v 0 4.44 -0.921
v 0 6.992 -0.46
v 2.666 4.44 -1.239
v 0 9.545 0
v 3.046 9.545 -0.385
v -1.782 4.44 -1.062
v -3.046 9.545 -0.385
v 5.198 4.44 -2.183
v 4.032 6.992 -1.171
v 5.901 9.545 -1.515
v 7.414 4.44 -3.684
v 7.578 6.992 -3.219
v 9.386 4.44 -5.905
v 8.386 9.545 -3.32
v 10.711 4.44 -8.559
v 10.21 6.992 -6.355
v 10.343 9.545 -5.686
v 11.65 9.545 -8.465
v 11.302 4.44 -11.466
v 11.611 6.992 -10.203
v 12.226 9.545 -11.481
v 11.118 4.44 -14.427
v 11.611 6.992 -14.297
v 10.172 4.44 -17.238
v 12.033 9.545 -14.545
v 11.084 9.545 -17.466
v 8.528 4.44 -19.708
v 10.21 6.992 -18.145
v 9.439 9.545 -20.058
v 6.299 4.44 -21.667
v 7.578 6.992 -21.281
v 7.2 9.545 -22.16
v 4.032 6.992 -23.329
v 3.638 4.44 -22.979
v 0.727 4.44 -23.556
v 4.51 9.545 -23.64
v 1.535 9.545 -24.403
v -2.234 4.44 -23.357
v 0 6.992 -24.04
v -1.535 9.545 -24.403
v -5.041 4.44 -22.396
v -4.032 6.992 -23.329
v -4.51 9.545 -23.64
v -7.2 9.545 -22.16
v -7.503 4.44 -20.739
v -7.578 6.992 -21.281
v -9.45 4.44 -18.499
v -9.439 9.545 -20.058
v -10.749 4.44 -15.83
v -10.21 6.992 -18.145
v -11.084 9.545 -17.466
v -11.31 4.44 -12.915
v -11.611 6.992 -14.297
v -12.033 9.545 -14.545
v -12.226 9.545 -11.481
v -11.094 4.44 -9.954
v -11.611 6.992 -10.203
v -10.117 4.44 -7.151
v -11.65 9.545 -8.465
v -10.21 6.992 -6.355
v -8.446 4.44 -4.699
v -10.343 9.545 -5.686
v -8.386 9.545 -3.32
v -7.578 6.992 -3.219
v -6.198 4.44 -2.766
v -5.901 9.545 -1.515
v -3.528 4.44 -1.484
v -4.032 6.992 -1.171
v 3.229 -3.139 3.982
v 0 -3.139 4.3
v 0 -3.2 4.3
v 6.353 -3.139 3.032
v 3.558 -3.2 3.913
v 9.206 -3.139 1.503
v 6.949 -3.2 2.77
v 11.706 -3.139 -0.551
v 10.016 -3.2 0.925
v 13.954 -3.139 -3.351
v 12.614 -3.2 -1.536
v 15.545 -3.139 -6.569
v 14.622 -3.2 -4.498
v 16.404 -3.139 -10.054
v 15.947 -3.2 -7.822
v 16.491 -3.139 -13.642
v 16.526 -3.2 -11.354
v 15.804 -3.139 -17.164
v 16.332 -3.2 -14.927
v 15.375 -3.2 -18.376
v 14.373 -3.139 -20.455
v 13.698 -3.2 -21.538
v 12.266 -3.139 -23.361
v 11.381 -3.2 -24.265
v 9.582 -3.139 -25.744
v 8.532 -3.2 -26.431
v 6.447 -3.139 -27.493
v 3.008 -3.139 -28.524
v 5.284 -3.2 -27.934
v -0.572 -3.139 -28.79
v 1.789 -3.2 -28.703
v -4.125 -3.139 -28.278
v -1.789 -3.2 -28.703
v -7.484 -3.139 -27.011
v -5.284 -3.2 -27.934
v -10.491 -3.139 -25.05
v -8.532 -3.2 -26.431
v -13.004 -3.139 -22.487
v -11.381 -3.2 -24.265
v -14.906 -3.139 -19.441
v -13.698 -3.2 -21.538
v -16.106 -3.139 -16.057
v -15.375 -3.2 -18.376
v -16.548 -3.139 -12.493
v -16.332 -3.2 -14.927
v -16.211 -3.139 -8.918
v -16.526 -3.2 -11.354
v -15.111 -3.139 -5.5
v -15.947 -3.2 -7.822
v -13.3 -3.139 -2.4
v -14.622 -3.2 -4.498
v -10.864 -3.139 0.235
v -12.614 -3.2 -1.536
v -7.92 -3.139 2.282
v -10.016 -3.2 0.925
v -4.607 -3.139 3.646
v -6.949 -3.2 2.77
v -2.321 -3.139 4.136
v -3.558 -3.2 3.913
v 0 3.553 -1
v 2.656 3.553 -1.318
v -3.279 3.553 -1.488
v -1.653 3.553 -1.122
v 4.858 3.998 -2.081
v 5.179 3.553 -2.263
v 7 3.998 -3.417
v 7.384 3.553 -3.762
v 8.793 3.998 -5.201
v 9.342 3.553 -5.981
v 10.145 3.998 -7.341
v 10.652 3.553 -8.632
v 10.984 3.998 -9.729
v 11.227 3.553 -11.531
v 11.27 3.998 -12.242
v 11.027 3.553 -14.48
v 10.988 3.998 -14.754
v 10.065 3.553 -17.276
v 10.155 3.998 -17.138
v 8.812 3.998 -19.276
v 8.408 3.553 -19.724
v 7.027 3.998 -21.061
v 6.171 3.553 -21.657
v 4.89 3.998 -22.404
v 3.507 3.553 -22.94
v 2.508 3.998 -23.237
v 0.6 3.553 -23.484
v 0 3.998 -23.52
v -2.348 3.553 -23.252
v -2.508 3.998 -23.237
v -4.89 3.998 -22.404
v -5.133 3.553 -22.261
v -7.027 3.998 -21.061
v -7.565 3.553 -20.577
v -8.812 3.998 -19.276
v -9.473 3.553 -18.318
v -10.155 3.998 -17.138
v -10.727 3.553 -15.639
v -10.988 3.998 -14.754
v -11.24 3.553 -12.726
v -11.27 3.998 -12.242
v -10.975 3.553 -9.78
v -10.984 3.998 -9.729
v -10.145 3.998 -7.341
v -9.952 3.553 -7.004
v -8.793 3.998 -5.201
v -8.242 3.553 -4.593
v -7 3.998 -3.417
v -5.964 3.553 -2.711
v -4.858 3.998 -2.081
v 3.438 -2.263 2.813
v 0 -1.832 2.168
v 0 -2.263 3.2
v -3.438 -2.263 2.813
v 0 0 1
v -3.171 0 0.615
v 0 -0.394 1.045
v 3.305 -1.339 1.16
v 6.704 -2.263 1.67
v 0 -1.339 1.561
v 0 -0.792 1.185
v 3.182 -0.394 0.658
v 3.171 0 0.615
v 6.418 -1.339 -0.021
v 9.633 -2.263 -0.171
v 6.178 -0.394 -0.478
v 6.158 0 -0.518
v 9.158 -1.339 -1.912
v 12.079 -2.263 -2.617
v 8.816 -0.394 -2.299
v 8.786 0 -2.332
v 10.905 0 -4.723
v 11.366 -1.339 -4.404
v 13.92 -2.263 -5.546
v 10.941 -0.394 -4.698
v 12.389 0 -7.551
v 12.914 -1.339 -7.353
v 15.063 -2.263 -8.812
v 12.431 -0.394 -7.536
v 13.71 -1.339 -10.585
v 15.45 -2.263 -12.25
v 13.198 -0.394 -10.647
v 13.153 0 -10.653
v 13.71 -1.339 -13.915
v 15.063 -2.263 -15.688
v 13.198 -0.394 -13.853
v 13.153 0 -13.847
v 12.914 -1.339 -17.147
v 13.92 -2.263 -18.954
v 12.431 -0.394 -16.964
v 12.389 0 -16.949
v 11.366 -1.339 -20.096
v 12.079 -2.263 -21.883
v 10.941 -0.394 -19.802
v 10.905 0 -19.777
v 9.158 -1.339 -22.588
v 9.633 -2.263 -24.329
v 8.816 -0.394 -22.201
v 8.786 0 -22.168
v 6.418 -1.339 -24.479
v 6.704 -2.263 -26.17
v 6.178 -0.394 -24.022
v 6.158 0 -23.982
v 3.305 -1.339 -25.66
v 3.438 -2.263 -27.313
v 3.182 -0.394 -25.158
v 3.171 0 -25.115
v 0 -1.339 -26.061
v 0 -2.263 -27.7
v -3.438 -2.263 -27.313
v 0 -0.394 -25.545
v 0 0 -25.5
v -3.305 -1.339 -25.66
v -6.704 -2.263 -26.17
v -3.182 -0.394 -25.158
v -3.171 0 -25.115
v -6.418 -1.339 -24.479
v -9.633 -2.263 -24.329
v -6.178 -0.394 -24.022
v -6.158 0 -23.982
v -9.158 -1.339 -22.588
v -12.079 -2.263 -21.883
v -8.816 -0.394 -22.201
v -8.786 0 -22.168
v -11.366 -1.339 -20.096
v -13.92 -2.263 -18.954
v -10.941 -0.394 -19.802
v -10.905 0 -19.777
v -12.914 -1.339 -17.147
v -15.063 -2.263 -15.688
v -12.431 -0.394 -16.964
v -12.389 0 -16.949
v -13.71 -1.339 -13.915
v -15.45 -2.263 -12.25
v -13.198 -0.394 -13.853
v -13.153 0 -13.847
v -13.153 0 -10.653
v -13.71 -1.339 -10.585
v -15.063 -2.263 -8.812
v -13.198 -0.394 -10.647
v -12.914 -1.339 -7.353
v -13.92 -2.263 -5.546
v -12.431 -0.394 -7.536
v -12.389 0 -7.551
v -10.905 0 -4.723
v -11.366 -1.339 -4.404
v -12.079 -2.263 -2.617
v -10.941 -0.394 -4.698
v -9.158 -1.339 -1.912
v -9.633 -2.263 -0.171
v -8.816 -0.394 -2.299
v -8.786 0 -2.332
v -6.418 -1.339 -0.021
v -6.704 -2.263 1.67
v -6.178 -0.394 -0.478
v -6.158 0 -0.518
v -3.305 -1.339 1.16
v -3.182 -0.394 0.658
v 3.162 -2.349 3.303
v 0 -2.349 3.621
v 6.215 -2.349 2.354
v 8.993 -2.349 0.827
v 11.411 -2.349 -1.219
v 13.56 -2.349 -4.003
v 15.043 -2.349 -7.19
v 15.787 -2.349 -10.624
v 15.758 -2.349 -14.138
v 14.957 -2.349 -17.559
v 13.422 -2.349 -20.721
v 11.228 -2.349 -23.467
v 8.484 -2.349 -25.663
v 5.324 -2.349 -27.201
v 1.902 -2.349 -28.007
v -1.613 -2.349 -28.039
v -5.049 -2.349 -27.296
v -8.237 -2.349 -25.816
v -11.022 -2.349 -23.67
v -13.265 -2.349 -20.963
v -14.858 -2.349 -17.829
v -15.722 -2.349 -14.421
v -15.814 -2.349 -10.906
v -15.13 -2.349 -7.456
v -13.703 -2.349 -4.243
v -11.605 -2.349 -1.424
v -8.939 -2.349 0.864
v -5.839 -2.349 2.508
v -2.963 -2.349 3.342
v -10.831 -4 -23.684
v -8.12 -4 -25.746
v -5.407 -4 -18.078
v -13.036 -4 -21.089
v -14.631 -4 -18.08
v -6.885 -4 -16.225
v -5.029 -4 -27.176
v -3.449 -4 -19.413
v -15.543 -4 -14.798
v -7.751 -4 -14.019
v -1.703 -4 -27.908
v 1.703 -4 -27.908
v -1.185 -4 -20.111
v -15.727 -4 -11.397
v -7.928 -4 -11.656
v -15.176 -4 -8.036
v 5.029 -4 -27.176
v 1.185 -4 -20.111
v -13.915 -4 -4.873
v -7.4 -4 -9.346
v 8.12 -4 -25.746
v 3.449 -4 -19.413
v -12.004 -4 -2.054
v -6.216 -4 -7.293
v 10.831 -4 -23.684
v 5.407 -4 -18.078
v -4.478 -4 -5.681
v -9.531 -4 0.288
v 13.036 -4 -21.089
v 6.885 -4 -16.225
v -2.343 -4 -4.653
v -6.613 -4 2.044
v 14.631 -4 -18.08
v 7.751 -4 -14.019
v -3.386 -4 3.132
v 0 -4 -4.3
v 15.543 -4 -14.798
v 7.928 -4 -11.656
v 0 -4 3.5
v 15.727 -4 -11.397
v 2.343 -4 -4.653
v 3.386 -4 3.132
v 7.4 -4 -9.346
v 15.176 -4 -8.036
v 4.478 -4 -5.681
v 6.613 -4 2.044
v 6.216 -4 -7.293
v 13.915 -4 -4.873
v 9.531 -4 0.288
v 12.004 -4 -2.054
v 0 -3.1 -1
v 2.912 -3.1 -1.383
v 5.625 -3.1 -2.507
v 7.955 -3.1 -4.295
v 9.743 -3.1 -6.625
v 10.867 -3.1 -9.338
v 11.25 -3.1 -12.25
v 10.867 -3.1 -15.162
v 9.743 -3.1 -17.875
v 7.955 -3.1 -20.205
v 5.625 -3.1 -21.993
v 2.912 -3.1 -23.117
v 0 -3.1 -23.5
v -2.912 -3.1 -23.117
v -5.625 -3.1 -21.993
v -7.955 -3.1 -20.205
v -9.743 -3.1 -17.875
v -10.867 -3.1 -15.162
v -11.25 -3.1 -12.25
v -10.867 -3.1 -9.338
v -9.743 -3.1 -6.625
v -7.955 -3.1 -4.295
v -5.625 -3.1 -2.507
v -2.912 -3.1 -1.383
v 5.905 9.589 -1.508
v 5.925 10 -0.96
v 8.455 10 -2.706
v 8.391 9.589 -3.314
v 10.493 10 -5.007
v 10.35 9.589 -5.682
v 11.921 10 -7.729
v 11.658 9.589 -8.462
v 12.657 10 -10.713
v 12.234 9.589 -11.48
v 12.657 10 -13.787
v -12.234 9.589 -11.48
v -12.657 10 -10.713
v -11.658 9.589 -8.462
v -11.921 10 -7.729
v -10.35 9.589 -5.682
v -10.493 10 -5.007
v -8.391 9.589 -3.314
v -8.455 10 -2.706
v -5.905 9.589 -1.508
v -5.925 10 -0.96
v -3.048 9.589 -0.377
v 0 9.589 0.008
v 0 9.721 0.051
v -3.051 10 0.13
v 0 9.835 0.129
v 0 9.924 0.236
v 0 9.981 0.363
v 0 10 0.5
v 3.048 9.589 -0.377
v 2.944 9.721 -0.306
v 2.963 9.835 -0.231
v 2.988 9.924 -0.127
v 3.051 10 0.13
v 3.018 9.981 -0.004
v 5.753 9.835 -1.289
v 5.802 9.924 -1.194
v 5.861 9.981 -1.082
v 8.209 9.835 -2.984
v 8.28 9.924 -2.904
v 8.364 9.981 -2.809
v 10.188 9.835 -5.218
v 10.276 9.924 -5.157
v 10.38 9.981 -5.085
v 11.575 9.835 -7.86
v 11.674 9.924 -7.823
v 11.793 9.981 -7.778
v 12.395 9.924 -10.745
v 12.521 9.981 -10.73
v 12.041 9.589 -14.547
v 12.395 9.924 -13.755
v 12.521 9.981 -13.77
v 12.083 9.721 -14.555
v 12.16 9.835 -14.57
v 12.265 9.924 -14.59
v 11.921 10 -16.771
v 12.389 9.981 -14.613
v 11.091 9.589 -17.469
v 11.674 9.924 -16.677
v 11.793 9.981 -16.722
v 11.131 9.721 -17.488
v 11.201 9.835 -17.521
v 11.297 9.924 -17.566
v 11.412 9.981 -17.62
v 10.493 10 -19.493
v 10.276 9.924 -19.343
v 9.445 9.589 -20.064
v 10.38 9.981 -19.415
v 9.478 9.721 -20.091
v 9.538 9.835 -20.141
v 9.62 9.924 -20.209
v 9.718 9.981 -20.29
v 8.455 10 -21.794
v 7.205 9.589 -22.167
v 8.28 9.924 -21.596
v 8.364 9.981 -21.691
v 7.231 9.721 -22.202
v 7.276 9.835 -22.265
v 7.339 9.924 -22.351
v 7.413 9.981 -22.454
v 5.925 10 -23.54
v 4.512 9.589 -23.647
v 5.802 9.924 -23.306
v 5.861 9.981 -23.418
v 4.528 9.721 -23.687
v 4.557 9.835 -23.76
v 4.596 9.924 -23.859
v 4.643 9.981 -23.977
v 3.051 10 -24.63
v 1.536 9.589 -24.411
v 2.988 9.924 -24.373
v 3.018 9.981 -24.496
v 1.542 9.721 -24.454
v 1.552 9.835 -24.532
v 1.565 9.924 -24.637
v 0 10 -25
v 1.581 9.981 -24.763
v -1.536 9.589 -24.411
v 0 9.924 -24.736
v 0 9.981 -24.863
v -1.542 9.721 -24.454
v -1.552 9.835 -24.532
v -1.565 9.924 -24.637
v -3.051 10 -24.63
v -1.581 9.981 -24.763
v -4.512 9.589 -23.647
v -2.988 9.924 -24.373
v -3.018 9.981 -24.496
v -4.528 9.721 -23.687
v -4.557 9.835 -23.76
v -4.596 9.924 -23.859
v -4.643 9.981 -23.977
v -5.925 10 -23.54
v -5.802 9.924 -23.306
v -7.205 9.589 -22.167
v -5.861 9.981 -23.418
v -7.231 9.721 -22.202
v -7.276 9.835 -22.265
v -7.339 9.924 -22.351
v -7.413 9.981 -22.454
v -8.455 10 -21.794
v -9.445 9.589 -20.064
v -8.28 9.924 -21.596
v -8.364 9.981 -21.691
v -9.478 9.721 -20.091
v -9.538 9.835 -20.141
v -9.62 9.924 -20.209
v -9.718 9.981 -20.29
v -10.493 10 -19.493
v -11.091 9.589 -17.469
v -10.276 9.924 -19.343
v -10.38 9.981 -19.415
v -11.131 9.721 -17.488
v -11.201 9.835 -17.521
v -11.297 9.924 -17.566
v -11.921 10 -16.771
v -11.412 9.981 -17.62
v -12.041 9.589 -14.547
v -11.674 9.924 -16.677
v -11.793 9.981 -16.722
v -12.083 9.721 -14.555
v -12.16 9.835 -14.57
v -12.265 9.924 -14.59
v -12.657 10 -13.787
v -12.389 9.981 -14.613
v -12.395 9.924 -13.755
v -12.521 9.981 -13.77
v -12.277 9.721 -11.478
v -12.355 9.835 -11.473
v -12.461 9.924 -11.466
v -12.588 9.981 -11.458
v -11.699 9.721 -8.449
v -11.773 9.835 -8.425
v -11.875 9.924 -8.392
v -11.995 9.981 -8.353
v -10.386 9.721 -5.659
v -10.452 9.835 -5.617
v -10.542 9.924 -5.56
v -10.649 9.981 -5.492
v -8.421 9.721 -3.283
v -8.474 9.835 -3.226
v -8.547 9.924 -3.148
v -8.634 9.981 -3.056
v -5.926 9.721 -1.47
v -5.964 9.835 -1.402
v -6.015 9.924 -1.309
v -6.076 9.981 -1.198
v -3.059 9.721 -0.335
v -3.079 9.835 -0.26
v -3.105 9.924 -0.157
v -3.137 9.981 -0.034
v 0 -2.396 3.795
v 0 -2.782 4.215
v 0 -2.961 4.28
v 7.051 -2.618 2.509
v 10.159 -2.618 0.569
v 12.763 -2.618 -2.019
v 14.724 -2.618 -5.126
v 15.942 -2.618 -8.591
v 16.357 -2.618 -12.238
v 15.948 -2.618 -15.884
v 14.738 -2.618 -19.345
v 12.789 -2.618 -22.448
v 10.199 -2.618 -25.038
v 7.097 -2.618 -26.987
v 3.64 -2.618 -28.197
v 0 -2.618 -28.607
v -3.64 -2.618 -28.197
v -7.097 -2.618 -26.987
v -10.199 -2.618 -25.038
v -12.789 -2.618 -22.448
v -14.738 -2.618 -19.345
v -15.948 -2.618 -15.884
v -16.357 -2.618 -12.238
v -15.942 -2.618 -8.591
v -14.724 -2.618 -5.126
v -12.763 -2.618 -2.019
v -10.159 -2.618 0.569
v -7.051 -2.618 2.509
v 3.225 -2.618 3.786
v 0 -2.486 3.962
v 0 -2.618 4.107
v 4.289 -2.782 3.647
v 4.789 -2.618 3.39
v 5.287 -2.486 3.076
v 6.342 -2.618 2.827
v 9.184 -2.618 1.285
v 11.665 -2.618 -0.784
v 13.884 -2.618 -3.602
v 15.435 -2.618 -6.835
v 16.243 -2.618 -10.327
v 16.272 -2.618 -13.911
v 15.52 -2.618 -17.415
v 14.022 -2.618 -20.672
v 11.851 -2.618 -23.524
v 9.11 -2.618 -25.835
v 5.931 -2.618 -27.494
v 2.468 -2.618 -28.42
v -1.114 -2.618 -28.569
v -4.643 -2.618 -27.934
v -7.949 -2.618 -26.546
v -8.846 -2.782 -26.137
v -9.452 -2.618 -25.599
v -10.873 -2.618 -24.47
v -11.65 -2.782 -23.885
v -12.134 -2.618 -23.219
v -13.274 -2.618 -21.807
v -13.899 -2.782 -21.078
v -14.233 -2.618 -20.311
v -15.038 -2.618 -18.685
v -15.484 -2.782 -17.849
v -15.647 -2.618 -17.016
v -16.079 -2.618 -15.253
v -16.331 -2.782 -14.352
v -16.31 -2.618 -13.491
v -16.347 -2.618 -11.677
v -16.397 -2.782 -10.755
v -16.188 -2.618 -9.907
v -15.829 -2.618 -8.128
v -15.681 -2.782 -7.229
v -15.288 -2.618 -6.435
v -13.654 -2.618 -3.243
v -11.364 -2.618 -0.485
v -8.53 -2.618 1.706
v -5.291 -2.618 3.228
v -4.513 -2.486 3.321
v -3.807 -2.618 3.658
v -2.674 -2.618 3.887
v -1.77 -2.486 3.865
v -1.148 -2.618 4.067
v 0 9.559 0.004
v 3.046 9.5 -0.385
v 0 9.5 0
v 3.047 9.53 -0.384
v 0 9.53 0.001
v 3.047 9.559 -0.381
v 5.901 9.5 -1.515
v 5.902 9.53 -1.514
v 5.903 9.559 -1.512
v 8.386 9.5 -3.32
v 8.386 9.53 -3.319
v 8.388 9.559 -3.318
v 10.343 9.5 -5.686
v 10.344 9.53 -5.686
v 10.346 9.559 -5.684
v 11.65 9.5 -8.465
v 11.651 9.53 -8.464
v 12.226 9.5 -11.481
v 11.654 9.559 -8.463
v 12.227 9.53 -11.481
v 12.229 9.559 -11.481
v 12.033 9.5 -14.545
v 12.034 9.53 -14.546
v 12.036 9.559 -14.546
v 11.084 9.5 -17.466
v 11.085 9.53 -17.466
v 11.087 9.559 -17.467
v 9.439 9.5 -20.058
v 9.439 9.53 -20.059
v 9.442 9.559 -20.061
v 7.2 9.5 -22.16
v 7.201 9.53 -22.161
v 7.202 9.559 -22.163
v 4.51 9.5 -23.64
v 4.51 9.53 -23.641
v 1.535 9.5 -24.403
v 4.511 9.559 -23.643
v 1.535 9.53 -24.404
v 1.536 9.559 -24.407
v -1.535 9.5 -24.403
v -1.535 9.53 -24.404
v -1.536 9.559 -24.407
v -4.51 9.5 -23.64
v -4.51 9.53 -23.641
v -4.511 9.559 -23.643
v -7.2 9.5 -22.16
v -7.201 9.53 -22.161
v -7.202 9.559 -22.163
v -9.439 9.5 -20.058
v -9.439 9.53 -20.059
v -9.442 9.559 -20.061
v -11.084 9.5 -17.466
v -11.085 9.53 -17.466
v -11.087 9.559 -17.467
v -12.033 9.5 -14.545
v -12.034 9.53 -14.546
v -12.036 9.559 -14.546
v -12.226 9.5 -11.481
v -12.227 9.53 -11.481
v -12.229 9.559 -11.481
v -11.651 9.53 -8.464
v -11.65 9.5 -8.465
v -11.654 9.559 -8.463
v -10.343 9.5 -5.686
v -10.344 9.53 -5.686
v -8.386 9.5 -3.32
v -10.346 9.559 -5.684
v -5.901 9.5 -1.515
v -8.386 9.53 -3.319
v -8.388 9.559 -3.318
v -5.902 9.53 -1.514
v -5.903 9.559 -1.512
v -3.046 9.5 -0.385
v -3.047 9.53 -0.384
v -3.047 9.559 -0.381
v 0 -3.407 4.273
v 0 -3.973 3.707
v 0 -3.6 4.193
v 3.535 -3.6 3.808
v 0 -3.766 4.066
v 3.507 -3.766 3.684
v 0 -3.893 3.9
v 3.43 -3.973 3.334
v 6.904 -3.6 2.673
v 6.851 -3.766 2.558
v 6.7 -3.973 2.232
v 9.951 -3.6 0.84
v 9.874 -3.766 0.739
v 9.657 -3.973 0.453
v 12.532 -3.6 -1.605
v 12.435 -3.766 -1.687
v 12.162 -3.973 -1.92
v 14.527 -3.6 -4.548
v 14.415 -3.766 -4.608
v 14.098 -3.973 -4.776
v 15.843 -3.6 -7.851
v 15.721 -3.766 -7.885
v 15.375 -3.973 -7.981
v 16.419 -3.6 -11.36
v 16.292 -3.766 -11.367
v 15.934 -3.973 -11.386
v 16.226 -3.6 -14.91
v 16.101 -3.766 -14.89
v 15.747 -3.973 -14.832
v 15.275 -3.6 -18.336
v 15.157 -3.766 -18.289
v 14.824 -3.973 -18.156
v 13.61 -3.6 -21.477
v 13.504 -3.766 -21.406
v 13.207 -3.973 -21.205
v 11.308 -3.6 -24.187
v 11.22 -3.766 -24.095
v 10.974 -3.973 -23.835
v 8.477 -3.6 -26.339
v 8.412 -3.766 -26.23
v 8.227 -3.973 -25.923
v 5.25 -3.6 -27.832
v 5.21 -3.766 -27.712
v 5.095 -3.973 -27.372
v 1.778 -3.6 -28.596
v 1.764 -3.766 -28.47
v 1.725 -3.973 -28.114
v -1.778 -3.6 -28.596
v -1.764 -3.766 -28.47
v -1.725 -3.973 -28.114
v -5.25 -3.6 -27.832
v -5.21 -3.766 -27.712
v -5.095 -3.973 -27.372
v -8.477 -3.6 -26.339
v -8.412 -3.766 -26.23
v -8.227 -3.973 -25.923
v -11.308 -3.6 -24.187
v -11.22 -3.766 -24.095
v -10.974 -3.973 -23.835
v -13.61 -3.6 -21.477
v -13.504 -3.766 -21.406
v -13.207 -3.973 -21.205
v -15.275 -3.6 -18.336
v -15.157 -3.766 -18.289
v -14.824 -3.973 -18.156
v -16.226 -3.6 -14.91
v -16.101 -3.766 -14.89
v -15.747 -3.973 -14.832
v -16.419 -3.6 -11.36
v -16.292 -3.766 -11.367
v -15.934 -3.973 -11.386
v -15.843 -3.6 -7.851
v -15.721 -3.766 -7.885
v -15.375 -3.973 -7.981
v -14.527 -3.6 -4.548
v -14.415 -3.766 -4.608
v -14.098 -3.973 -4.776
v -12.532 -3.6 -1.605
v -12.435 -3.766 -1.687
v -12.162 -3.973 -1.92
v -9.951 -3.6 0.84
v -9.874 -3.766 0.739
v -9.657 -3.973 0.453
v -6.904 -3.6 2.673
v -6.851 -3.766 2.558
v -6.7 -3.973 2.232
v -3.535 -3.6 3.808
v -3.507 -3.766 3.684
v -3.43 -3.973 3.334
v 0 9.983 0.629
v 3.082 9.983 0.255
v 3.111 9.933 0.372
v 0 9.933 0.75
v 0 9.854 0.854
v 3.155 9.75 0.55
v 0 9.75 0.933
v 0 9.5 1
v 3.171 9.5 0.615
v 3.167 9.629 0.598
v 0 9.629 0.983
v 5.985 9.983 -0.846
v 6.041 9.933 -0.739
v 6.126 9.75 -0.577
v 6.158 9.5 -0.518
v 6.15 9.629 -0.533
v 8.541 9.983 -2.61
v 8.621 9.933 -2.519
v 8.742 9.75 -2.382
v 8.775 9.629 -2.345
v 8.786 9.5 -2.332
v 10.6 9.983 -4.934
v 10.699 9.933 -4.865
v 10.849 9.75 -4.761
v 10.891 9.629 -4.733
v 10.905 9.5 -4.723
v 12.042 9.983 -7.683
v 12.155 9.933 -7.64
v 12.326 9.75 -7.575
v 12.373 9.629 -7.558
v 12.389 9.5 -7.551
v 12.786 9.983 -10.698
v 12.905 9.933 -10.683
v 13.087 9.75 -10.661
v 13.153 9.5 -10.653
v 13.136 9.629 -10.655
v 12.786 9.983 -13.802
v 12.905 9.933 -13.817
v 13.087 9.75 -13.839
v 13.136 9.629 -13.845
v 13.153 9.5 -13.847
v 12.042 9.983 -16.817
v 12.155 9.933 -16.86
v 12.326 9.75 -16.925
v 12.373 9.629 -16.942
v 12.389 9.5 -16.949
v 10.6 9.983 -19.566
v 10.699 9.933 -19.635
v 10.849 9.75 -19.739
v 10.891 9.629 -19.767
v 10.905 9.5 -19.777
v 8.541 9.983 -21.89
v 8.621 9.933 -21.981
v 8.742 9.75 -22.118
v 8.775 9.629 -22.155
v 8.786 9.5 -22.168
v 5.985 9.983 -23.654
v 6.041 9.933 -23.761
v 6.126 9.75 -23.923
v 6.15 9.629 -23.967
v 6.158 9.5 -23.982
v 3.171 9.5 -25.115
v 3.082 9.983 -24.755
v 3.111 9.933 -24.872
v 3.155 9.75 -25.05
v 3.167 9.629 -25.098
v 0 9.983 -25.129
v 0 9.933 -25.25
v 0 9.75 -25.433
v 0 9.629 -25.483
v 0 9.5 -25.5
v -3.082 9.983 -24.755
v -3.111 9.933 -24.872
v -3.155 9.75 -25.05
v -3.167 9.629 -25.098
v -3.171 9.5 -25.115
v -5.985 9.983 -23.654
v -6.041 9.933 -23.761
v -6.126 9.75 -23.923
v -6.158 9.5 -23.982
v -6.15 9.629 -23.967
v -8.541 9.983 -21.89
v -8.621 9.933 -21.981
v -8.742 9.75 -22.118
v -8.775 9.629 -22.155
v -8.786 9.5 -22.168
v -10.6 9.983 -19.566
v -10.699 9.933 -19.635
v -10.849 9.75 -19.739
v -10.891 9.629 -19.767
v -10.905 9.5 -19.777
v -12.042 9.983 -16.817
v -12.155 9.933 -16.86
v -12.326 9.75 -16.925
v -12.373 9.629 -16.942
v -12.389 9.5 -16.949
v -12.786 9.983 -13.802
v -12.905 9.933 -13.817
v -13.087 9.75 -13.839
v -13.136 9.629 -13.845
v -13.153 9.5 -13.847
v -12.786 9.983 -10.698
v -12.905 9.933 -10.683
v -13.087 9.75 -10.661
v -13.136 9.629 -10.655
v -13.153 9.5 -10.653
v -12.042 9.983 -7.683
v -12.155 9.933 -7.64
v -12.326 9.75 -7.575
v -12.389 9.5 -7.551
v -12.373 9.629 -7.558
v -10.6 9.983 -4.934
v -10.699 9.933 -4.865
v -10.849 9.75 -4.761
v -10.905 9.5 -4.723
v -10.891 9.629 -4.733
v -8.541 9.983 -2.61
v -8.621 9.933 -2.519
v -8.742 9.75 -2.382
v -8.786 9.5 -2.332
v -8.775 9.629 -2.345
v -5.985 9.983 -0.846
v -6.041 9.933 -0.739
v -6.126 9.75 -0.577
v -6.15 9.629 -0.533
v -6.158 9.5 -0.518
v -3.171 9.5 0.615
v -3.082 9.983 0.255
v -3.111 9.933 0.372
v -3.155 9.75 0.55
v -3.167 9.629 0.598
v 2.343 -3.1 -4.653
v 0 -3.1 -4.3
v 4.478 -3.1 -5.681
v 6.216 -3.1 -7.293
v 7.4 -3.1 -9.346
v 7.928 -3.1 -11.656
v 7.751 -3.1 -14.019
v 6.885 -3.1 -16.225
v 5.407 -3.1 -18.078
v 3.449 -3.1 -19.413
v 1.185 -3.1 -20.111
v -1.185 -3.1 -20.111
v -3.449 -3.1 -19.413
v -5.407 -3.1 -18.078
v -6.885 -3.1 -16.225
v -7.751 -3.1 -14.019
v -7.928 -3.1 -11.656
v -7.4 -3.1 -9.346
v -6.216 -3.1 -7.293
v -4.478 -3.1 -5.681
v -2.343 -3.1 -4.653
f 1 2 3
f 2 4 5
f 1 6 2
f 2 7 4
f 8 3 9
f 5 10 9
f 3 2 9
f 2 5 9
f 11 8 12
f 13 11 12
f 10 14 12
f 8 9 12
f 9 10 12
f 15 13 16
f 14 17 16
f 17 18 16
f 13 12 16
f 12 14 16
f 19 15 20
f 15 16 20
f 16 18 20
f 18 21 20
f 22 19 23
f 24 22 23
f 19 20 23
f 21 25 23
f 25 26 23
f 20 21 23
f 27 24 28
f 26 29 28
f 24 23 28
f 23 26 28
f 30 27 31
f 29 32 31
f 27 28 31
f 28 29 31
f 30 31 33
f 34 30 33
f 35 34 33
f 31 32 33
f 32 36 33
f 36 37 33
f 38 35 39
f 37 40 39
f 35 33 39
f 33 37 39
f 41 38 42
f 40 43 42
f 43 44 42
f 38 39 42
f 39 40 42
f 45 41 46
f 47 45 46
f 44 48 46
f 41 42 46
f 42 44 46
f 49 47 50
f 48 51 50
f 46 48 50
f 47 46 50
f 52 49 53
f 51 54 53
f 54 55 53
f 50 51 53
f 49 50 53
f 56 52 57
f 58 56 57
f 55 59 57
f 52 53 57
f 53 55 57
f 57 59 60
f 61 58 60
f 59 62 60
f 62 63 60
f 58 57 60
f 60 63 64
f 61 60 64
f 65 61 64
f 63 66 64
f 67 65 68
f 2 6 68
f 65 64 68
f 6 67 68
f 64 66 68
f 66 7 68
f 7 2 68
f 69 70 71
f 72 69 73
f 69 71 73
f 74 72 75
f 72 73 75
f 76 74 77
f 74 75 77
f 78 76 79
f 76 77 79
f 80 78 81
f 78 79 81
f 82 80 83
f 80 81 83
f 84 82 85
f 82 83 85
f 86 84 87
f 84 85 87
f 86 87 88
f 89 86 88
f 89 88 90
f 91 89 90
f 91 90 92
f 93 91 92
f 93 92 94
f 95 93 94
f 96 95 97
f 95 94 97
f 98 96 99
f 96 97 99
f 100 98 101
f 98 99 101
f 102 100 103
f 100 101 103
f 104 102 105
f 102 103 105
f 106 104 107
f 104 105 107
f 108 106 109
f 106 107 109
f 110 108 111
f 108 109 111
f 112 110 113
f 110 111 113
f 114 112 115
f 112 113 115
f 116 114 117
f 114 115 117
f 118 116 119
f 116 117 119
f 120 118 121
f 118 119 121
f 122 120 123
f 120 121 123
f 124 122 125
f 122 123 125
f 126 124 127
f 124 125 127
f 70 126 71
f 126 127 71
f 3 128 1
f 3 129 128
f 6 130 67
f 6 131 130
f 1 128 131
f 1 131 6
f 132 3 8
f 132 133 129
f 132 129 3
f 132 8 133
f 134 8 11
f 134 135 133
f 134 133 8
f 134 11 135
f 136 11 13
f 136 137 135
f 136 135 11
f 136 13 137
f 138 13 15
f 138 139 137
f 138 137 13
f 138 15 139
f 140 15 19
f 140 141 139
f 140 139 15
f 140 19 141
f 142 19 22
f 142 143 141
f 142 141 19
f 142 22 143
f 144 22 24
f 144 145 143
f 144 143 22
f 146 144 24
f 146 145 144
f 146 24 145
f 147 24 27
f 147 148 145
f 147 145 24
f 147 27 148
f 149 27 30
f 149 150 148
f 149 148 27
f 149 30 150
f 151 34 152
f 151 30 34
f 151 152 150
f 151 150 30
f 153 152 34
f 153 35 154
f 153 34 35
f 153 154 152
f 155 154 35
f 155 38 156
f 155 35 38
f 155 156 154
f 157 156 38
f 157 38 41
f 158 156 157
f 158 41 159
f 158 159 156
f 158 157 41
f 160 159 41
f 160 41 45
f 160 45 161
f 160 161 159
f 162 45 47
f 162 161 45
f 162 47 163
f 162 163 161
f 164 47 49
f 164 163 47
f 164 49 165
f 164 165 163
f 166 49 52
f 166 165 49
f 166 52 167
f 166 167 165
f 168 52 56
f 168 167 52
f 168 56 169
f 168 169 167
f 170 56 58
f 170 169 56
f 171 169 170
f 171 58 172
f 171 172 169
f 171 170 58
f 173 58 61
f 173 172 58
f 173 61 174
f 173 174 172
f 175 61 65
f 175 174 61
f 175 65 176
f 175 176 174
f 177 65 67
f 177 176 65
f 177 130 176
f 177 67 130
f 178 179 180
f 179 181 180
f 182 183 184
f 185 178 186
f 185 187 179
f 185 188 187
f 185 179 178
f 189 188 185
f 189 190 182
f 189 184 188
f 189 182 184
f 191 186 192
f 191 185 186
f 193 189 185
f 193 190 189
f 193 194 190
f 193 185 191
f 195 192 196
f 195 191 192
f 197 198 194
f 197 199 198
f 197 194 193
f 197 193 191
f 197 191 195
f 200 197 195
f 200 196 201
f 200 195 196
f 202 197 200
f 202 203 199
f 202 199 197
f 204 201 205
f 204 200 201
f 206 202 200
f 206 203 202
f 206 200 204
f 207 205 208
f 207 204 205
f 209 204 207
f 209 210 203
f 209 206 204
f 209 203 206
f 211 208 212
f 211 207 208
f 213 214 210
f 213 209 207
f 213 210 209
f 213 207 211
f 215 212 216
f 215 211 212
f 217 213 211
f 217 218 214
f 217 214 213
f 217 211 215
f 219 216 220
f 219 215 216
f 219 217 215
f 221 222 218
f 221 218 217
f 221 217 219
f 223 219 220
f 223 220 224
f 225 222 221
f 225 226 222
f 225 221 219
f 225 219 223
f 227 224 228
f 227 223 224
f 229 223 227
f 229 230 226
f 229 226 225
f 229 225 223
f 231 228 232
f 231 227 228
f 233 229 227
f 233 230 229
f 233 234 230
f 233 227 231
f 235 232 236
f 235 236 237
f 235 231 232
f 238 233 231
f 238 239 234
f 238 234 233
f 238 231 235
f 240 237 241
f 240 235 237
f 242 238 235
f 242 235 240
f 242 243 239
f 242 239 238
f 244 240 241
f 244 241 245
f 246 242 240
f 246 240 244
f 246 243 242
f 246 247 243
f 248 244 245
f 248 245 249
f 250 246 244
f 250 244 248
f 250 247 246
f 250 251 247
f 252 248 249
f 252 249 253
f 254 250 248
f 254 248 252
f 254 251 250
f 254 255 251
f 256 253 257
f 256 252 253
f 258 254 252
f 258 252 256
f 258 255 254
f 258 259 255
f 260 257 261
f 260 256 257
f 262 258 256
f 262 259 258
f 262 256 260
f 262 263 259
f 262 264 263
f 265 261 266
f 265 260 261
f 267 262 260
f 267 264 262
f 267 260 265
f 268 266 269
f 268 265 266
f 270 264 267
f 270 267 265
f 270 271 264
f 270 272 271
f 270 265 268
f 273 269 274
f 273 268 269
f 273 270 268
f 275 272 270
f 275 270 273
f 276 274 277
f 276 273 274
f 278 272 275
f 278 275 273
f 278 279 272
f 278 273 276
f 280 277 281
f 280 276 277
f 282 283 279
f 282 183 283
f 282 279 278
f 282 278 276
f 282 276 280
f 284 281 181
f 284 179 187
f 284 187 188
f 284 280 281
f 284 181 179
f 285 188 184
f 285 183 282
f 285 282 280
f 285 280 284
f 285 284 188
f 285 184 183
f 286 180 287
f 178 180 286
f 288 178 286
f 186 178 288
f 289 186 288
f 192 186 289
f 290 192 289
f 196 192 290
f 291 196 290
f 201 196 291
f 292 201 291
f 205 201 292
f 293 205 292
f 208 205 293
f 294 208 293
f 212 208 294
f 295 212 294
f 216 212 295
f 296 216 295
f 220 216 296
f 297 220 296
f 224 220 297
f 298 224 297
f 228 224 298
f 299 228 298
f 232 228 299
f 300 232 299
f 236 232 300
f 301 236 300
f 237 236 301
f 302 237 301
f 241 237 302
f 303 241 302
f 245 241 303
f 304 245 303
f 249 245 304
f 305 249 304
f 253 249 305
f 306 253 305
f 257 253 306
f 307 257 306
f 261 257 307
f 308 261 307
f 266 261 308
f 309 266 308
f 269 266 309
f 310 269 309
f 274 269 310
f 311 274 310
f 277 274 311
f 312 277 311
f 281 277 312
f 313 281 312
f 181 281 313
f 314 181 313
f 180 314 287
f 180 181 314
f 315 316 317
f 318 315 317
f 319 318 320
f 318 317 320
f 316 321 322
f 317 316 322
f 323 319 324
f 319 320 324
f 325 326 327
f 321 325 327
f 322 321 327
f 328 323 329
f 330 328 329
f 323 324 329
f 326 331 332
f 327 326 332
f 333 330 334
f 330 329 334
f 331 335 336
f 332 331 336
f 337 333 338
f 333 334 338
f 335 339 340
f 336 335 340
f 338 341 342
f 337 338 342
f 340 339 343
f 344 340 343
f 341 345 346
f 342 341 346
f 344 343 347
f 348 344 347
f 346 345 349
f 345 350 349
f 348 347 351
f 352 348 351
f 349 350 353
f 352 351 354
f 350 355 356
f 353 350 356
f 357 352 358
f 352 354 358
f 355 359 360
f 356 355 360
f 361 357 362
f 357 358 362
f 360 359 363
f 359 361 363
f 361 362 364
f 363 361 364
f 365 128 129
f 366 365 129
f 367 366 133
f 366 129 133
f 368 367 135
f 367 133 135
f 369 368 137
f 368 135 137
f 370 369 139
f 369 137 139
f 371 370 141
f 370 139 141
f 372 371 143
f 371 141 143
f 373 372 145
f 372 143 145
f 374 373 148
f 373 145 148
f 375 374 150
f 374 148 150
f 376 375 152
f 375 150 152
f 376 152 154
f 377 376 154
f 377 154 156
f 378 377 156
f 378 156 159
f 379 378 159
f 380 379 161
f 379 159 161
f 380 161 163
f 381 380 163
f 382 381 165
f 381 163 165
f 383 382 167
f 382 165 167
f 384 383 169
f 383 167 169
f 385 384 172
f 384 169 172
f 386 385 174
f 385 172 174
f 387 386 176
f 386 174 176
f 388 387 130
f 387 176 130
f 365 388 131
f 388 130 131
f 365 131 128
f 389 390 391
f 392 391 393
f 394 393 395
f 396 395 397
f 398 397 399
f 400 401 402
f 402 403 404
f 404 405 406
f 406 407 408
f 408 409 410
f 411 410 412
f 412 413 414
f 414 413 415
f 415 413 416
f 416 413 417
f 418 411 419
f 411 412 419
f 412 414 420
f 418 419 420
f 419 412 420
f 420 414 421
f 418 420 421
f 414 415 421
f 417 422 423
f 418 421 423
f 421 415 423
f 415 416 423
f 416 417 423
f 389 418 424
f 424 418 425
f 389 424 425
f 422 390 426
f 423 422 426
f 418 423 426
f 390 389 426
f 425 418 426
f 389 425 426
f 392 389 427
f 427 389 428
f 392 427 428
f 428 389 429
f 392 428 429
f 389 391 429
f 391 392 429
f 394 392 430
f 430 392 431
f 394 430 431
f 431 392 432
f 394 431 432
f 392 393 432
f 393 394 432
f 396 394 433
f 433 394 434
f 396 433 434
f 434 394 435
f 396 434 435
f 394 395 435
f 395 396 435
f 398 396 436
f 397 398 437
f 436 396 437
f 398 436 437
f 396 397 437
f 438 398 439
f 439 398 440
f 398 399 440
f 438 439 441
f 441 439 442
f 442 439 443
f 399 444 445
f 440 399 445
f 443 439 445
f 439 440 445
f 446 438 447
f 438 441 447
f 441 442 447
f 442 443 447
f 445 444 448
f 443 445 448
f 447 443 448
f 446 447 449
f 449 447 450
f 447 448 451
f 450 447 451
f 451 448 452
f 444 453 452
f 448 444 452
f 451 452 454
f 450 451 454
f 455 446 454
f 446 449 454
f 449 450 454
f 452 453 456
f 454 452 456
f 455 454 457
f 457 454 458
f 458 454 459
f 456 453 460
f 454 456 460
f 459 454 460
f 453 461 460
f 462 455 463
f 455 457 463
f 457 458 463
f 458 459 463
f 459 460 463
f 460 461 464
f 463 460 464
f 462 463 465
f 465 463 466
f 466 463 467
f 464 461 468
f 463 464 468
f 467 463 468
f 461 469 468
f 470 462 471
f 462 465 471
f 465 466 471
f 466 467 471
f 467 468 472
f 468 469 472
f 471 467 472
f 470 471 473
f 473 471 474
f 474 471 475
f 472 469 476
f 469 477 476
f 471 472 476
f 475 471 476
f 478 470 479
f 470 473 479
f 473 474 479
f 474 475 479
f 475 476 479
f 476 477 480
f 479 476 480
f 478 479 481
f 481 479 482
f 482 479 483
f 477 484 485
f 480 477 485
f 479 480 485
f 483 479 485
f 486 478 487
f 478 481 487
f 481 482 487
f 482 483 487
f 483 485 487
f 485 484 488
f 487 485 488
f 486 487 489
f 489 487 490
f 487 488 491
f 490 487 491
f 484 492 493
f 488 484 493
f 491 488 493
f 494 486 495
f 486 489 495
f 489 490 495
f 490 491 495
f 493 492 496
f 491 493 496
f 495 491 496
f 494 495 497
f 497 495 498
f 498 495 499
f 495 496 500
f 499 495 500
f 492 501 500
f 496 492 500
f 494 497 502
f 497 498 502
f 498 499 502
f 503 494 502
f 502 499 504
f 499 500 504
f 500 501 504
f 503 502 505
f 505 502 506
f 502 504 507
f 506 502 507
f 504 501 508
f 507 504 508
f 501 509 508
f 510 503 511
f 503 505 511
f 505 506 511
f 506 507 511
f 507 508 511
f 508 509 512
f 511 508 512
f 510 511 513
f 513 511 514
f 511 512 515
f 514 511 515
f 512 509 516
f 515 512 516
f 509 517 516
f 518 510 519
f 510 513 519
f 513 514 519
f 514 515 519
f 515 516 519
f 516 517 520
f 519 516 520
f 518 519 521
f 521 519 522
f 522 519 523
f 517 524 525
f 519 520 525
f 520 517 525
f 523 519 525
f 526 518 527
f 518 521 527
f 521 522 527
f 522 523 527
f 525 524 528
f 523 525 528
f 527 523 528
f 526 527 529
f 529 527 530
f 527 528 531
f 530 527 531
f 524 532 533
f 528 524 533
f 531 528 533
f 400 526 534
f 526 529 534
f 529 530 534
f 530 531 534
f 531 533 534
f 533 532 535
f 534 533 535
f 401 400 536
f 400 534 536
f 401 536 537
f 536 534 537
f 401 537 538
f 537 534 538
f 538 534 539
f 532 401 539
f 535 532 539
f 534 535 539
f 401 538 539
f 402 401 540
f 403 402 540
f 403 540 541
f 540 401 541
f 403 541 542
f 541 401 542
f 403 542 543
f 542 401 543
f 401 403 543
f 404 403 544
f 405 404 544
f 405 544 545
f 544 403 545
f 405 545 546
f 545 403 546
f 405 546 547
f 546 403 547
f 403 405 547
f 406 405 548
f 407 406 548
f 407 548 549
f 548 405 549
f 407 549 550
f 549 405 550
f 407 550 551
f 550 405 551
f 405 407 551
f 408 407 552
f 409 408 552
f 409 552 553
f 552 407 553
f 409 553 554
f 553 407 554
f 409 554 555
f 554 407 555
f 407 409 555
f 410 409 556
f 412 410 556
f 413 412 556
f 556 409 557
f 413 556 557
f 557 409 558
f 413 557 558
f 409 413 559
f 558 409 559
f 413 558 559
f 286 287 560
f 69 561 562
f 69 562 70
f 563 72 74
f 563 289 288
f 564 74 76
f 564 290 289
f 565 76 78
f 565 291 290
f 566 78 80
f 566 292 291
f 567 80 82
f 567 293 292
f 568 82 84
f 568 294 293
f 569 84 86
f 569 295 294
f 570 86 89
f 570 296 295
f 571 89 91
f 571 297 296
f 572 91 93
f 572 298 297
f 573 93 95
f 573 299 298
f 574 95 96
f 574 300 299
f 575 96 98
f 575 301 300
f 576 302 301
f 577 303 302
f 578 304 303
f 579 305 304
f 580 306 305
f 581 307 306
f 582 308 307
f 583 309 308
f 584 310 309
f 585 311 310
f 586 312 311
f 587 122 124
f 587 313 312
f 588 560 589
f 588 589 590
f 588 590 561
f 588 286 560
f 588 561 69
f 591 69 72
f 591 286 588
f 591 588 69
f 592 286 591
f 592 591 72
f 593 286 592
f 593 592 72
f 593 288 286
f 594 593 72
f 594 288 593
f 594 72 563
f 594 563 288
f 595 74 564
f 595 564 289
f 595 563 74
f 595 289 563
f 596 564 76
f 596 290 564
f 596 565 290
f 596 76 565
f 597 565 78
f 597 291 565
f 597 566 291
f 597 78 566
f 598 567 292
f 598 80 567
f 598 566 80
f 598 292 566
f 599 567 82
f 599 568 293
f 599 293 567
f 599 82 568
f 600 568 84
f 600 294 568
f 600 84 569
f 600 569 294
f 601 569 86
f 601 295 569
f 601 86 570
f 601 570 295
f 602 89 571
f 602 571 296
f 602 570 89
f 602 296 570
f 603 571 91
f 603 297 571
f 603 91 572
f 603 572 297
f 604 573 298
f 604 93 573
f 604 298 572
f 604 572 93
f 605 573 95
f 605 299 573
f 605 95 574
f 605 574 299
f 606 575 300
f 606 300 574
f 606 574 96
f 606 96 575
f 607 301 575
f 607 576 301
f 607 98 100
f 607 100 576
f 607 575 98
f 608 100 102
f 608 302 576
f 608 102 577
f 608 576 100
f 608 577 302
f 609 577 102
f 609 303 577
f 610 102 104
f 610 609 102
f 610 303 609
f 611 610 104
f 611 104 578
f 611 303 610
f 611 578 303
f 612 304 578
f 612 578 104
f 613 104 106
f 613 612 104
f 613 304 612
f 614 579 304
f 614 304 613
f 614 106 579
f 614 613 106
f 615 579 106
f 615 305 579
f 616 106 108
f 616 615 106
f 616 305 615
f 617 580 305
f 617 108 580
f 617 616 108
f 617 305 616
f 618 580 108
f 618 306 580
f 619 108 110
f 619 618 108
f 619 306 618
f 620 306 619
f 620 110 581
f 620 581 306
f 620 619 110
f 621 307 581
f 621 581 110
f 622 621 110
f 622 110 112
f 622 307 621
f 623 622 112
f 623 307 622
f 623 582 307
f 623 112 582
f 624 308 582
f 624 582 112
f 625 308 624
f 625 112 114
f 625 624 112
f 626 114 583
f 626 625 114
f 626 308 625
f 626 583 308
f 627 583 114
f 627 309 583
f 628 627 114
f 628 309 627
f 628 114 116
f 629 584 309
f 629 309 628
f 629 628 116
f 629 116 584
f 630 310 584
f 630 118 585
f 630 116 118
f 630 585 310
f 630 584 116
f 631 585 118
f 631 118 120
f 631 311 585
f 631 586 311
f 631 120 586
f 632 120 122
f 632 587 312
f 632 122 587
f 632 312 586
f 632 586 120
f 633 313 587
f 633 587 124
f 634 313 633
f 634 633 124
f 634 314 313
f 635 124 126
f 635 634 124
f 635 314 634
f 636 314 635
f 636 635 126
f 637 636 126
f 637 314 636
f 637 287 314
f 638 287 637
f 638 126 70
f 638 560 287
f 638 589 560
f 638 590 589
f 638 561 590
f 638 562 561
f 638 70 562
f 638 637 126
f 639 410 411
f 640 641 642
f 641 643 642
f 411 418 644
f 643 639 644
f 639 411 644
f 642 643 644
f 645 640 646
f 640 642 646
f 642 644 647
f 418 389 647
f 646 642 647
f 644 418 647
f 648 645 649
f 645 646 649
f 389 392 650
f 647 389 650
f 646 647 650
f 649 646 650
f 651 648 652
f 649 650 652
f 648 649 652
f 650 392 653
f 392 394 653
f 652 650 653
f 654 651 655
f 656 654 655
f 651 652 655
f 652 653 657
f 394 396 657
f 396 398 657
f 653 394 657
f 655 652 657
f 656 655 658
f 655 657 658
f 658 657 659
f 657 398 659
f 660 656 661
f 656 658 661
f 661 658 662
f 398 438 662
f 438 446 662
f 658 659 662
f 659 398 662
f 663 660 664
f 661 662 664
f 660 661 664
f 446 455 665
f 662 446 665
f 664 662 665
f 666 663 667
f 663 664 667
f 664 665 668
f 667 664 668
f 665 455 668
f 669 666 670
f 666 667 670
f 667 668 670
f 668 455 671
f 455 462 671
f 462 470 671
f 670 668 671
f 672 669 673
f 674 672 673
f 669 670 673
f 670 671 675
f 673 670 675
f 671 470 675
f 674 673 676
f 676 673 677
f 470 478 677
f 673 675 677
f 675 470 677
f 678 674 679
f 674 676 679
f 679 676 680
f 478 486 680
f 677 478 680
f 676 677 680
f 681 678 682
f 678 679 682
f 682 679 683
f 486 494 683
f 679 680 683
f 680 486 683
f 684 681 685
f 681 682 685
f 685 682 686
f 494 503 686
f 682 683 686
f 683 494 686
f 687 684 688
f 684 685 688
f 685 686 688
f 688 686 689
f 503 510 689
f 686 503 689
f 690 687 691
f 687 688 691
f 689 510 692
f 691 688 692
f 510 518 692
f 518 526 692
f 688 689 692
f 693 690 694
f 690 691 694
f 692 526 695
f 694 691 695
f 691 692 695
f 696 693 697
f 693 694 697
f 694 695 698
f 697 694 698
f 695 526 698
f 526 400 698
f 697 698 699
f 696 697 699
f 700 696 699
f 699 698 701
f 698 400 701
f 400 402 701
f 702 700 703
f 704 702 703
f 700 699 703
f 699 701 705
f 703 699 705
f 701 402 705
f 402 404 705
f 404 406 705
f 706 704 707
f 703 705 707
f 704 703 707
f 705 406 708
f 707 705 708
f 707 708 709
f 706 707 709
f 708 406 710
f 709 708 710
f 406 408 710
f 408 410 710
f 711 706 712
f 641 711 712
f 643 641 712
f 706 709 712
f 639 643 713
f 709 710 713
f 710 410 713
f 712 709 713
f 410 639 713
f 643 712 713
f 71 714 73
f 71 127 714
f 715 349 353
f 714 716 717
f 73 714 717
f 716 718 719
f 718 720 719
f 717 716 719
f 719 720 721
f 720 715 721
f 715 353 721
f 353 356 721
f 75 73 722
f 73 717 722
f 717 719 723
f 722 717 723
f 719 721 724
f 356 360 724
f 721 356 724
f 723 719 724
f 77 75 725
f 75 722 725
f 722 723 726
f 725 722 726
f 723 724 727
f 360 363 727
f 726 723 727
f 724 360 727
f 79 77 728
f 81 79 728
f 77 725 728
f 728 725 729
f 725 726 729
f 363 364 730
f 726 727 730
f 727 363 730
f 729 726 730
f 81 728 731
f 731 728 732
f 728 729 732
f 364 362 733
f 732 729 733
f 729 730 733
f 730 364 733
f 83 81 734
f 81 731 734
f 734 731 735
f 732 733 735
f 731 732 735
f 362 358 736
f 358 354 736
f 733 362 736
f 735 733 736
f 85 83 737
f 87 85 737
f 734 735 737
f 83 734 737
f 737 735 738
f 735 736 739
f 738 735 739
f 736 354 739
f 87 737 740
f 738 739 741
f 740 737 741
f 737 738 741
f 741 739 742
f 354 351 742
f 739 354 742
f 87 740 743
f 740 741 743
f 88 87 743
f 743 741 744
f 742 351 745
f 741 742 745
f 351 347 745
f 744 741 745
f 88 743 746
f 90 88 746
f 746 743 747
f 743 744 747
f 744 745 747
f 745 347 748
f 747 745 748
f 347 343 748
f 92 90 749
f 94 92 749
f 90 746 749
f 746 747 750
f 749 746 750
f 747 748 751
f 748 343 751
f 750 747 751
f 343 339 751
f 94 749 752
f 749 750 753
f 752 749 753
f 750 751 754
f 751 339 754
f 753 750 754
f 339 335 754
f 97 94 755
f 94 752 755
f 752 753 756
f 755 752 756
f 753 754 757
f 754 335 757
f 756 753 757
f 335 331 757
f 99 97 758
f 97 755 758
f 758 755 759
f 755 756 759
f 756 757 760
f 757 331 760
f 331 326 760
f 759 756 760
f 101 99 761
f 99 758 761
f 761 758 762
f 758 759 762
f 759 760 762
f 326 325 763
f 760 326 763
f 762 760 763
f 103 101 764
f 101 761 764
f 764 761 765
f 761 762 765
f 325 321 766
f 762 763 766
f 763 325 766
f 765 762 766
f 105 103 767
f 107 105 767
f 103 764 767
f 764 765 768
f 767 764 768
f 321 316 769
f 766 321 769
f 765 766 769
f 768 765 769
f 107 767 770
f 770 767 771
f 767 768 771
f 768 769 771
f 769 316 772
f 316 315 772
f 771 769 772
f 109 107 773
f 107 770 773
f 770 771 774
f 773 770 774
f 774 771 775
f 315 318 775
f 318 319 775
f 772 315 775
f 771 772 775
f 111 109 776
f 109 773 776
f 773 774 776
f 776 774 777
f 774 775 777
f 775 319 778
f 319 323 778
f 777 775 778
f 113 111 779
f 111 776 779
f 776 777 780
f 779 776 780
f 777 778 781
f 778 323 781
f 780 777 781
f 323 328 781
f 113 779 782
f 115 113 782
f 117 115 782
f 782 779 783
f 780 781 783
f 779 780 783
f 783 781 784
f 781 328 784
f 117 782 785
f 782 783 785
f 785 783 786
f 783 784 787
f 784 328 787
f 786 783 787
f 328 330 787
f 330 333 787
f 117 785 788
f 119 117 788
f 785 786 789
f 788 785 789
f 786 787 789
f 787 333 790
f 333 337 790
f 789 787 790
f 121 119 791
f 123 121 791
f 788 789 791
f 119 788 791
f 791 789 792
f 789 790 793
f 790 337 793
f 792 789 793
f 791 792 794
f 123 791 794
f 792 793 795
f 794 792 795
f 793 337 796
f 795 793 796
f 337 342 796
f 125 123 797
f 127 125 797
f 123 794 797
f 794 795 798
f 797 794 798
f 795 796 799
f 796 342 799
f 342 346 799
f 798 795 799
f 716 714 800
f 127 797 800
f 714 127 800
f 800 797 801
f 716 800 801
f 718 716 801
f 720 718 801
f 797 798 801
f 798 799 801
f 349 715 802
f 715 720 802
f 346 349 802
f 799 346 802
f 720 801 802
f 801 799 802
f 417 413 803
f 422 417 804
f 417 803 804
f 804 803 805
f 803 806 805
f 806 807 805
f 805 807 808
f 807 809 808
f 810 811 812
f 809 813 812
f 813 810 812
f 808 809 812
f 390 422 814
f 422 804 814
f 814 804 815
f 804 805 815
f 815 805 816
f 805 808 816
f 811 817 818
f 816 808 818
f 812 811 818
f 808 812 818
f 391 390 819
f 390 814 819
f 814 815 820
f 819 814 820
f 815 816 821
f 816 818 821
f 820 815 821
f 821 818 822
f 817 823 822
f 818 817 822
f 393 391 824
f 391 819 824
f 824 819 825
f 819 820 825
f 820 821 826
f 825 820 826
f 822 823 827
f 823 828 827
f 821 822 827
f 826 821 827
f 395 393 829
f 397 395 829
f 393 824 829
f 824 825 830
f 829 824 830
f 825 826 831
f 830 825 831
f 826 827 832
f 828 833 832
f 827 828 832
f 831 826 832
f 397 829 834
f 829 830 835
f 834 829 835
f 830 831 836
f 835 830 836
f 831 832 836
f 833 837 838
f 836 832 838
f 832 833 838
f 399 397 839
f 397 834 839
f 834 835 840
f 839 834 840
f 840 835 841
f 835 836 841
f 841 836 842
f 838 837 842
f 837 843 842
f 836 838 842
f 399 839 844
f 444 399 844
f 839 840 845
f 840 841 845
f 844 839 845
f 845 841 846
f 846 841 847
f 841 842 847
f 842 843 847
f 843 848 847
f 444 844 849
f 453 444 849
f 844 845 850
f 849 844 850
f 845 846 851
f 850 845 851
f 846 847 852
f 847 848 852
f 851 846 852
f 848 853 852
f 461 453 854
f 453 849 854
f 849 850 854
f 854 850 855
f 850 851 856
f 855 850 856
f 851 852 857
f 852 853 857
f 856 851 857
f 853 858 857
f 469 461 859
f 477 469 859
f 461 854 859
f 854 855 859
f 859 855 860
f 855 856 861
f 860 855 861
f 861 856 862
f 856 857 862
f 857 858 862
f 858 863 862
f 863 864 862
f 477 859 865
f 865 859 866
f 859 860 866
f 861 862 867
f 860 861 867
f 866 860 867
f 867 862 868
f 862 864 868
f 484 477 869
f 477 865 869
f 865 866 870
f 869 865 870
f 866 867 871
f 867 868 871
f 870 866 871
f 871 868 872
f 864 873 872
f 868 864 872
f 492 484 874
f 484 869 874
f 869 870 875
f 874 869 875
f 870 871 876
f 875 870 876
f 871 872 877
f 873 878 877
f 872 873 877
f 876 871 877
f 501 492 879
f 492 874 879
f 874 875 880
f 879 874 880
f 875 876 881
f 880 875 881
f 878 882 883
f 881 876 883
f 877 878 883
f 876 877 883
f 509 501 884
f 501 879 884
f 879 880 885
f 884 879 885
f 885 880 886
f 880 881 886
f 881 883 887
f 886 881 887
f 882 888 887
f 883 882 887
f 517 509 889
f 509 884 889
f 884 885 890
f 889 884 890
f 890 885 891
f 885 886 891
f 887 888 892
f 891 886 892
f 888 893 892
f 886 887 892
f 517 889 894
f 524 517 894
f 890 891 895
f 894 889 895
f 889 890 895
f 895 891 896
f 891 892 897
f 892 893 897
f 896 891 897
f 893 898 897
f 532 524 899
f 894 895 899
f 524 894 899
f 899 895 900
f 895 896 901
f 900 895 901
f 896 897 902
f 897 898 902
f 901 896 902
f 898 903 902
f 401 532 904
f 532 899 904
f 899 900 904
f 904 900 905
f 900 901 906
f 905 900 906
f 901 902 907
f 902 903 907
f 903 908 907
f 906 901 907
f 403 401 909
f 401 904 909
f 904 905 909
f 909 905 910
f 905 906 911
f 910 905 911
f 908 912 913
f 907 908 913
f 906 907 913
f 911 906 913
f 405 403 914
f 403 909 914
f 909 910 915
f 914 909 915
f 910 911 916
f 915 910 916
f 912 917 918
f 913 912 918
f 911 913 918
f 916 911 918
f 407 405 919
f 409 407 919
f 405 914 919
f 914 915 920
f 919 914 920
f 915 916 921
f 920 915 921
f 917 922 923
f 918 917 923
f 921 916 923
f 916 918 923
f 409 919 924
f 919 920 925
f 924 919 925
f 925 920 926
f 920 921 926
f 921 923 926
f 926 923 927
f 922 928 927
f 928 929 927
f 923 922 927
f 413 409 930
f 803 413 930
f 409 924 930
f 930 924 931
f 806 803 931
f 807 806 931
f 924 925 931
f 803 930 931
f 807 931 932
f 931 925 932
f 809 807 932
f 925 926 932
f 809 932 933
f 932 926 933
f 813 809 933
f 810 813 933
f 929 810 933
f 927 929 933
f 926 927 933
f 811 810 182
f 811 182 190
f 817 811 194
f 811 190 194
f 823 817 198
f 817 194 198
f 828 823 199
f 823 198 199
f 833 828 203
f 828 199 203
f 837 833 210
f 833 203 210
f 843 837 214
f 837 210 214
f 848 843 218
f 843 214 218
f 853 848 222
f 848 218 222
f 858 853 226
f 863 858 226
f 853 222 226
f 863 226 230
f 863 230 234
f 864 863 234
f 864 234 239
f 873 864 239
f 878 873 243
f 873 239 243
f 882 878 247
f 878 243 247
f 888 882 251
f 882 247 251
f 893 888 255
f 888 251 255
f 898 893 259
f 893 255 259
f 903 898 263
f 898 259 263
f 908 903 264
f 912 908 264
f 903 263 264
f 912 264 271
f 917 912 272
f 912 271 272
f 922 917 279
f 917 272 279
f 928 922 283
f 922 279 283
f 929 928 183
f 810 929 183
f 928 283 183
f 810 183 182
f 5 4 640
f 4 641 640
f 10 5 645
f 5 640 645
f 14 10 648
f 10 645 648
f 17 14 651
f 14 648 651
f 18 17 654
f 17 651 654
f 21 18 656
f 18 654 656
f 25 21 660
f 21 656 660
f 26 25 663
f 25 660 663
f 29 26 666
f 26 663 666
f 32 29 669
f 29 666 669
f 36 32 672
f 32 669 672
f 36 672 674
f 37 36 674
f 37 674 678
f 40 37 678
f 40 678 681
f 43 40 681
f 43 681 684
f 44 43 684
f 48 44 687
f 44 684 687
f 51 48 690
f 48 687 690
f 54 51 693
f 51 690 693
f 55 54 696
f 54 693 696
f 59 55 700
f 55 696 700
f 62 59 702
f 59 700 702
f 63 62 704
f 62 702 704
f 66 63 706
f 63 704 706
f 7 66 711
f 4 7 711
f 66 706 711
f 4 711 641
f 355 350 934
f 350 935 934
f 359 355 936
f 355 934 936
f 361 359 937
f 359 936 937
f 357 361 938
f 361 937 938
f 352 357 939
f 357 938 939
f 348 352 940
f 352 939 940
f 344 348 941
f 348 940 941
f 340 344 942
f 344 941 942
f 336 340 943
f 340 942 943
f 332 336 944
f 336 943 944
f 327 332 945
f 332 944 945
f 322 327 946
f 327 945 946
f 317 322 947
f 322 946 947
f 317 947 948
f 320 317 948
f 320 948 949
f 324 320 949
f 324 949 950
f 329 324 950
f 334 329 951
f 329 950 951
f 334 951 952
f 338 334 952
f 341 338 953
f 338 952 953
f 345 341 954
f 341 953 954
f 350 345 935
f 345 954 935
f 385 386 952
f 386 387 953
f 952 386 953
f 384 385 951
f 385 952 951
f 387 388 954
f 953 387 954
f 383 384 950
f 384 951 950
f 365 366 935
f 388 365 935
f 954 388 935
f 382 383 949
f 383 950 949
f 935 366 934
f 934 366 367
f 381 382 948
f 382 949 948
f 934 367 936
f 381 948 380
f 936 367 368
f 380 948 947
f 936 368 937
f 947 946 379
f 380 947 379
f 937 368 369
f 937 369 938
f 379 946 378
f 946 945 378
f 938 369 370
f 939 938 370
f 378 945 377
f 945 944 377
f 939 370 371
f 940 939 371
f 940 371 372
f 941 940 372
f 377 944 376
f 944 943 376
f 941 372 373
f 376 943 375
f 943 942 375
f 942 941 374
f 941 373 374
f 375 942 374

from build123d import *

# Parameters (mm, degrees)
F2_R = 0.8
F3_R = 5


# Not quite as in the source:
# - a feature names something its author has since deleted; it is built from what else it names


with BuildPart() as f1:
    # F0 (on Right) → F1 (revolve)
    with BuildSketch(Plane.YZ):
        Polygon((-3.1, -1), (4, -1), (4, 0), (4, 1), (0, 1), (-4, 1), (-4, -1), align=None)
        Polygon((-3.1, -4.3), (-3.1, -1), (-4, -1), (-4, -2), (-4, -4.3), align=None)
        with BuildLine():
            Line((-4, 3.2), (-4, 1))
            Line((-4, 1), (0, 1))
            add(Edge.make_bspline(
                [(-2.2627416998, 3.2), (-1.6970562748, 1), (0, 1)],
                knots=[5.0522258898, 5.0522258898, 5.0522258898, 6.2831853072, 6.2831853072, 6.2831853072], degree=2, weights=[1, 0.8164965809, 1]))
            Line((-2.2627416998, 3.2), (-4, 3.2))
        make_face()
        with BuildLine():
            Line((-4, 4.3), (-4, 3.2))
            Line((-4, 3.2), (-2.2627416998, 3.2))
            add(Edge.make_bspline(
                [(-2.4, 4.3), (-2.4, 3.7338095117), (-2.2627416998, 3.2)],
                knots=[4.7123889804, 4.7123889804, 4.7123889804, 5.0522258898, 5.0522258898, 5.0522258898], degree=2, weights=[1, 0.9855985597, 1]))
            Line((-2.4, 4.3), (-4, 4.3))
        make_face()
        with BuildLine():
            Line((4, 1), (4, 0))
            Line((4, 0), (9.5, 0))
            ThreePointArc((9.5, 0), (9.1464466094, 0.1464466094), (9, 0.5))
            ThreePointArc((9, 0.5), (9.1464466094, 0.8535533906), (9.5, 1))
            Line((9.5, 1), (4, 1))
        make_face()
        with BuildLine():
            ThreePointArc((9, 0.5), (9.1464466094, 0.1464466094), (9.5, 0))
            ThreePointArc((9.5, 0), (9.5445491992, 0.0019885856), (9.5887440387, 0.0079385246))
            ThreePointArc((9.5887440387, 0.0079385246), (9.883648289, 0.1793537926), (10, 0.5))
            Line((10, 0.5), (9, 0.5))
        make_face()
        with BuildLine():
            ThreePointArc((10, 0.5), (9.8535533906, 0.8535533906), (9.5, 1))
            ThreePointArc((9.5, 1), (9.1464466094, 0.8535533906), (9, 0.5))
            Line((9, 0.5), (10, 0.5))
        make_face()
        Polygon((4, 0), (4, -1), (9.5447270865, 0), (9.5, 0), align=None)
    revolve(axis=Axis((0, 0, -12.25), (0, 1, 0)))

    # F2
    f2_edges = [f1.edges().sort_by_distance(p)[0] for p in [
        (0, -1.822195, 2.152356),
        (0, -2.4, -28.8),
        (0, -4, -28.8),
    ]]
    fillet(f2_edges, radius=F2_R)

    # F3
    f3_edges = [f1.edges().sort_by_distance(p)[0] for p in [
        (0, 4, -23.5),
    ]]
    fillet(f3_edges, radius=F3_R)


solid = f1.part
